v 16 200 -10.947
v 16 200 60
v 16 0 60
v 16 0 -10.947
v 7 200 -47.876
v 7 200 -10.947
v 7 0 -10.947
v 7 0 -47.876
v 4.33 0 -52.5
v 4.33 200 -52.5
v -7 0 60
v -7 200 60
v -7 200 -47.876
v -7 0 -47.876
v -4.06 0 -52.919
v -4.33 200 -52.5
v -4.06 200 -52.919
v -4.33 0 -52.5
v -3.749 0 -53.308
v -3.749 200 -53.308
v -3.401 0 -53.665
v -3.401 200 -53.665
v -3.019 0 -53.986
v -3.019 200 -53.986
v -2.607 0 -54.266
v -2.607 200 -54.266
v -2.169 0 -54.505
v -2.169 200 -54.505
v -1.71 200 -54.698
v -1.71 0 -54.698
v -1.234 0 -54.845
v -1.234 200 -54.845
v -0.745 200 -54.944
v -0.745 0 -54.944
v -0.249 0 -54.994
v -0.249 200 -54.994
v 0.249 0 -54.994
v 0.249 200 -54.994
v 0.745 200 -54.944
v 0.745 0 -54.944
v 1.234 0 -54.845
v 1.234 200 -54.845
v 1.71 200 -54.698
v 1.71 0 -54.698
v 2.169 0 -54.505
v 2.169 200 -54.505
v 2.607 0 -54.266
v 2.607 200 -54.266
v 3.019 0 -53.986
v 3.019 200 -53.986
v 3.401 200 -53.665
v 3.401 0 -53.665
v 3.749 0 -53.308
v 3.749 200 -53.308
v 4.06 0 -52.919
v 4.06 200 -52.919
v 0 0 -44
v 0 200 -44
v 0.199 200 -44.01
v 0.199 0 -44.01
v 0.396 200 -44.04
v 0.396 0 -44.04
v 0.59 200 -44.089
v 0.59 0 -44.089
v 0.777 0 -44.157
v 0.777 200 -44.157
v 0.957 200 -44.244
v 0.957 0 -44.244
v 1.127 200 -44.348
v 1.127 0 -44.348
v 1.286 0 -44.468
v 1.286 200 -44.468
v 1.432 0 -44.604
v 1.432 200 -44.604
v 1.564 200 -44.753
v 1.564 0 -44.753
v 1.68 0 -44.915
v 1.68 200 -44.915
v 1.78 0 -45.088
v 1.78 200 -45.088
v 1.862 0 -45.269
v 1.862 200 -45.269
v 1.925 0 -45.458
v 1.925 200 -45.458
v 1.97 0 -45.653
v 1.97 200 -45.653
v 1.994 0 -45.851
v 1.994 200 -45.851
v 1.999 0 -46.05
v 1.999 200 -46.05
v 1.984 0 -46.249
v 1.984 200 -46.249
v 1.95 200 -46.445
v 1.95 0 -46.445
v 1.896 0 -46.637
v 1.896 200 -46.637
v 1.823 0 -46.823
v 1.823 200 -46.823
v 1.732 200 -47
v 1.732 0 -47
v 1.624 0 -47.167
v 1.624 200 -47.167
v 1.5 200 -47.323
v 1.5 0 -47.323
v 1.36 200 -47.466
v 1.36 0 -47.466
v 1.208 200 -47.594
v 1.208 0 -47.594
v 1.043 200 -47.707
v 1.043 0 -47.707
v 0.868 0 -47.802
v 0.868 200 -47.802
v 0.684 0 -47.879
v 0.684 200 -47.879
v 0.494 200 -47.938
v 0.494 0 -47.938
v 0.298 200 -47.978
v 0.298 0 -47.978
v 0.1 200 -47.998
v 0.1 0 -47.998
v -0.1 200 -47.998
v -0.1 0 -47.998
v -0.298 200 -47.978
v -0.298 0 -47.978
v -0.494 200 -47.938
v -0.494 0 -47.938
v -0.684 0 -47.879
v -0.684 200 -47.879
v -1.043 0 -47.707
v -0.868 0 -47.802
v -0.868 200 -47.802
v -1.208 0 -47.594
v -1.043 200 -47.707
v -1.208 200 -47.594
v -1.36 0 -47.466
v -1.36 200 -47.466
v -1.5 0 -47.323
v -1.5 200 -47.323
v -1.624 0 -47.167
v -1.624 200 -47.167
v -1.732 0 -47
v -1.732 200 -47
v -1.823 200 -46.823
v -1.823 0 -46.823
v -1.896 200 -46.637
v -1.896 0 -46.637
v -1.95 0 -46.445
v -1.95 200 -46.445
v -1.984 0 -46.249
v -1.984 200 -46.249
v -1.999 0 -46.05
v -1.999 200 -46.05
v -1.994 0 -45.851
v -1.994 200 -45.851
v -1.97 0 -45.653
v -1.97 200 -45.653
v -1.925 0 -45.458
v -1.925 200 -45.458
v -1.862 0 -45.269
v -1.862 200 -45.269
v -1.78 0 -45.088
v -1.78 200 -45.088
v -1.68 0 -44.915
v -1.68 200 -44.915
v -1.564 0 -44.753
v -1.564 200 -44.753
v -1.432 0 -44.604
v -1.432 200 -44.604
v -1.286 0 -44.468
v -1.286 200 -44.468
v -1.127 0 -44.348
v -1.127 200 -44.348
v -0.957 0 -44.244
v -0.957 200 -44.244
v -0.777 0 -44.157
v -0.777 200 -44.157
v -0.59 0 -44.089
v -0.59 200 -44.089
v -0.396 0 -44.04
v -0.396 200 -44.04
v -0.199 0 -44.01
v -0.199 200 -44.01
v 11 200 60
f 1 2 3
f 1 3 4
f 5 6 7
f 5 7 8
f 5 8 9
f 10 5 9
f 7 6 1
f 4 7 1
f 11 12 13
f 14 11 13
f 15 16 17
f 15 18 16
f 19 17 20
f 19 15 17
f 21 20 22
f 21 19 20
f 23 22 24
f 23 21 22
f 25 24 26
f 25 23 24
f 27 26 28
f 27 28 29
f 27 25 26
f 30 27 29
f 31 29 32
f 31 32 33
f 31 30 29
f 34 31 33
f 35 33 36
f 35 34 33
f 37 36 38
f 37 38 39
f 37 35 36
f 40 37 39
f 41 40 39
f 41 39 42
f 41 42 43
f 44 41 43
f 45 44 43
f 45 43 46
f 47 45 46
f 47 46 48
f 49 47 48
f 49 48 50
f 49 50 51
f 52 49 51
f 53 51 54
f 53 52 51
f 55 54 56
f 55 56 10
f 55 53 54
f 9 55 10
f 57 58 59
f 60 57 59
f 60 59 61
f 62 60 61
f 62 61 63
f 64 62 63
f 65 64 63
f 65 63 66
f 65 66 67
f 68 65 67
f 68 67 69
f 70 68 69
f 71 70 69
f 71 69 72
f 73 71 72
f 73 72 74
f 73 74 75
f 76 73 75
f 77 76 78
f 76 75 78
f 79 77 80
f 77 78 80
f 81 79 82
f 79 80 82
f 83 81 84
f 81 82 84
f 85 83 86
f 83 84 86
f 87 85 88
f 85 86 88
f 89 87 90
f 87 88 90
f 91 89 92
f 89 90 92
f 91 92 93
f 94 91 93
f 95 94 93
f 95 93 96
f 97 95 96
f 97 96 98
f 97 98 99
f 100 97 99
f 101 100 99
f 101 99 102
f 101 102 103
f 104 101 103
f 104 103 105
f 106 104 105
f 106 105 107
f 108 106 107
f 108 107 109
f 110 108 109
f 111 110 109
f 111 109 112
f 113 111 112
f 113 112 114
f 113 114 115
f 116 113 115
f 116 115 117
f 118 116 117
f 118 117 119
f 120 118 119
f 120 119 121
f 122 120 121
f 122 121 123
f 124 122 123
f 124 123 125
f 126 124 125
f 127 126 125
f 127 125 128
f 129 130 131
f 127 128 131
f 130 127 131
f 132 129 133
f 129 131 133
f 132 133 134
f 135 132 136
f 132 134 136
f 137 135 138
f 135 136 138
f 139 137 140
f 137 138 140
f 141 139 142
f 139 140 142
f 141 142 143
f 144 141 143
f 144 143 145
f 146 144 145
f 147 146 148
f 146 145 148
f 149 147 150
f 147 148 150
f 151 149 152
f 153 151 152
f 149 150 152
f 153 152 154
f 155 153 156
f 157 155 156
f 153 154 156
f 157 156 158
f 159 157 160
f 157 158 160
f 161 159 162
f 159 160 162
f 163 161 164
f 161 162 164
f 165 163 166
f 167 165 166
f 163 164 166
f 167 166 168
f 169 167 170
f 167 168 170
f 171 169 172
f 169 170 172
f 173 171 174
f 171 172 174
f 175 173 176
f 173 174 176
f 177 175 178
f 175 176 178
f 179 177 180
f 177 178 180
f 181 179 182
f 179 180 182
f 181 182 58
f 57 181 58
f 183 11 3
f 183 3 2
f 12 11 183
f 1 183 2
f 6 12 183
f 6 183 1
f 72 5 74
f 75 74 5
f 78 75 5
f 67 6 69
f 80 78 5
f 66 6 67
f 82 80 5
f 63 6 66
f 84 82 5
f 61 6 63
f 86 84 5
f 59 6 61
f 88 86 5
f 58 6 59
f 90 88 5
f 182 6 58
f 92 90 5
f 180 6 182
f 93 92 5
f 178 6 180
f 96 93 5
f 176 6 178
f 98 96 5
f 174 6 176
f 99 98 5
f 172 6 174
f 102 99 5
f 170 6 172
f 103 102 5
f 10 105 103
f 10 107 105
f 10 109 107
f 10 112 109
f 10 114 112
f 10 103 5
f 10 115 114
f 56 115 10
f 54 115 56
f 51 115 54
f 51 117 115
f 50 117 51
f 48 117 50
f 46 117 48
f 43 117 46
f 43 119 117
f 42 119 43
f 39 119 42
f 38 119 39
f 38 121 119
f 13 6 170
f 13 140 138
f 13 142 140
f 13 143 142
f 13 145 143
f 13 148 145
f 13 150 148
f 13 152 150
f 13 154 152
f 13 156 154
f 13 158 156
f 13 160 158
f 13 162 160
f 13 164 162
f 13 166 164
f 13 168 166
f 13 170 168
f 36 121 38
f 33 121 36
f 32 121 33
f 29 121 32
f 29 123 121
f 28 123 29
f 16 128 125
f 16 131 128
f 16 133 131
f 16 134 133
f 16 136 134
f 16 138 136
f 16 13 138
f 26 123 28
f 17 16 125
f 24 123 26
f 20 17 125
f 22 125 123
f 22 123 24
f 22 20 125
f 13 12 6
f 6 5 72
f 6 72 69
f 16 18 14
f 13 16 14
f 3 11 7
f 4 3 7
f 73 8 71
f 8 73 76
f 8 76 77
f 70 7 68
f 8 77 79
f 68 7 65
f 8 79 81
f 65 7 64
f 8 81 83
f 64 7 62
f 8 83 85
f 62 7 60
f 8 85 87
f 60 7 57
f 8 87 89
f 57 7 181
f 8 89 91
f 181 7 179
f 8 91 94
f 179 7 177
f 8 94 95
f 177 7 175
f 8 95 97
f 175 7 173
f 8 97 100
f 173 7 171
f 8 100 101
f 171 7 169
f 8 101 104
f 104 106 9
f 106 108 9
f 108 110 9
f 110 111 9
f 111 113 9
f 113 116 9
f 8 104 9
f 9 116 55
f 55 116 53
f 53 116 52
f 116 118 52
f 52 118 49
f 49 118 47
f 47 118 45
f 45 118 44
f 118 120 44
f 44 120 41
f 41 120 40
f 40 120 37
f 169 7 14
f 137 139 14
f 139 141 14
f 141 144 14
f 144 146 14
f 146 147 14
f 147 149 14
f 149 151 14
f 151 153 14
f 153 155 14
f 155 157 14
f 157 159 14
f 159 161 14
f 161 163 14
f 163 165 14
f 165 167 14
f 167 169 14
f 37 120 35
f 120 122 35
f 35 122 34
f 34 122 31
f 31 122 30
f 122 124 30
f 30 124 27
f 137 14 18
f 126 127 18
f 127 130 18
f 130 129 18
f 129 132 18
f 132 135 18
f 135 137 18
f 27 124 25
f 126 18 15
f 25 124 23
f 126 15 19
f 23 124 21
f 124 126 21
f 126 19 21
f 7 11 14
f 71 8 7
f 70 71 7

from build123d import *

# Parameters (mm, degrees)
SKETCH1_W           = 22
SKETCH1_H           = 120
BOSS_EXTRUDE1_DEPTH = 200
SKETCH2_OUTSIDE_W   = 70.854
SKETCH2_OUTSIDE_H   = 168.854
CUT_EXTRUDE1_DEPTH  = 210.095671883
FILLET1_R           = 5
CUT_EXTRUDE2_DEPTH  = 210.095671883
SKETCH4_W           = 96.947441117
SKETCH4_H           = 200
BOSS_EXTRUDE2_DEPTH = 5
SKETCH5_W           = 4
SKETCH5_H           = 96.947441117
CUT_EXTRUDE3_DEPTH  = 210.418241803
SKETCH6_R           = 2
CUT_EXTRUDE4_DEPTH  = 210.418241803
SKETCH8_W           = 9
SKETCH8_H           = 26
CUT_EXTRUDE5_DEPTH  = 210.418241803


with BuildPart() as part:
    # Sketch1 → Boss-Extrude1 (new body)
    with BuildSketch(Plane(origin=(0, 0, 0), x_dir=(1, 0, 0), z_dir=(0, 1, 0))):
        Rectangle(SKETCH1_W, SKETCH1_H)
    extrude(amount=BOSS_EXTRUDE1_DEPTH)

    # Sketch2 outside → Cut-Extrude1 (cut, through all)
    with BuildSketch(Plane(origin=(0, 200, 0), x_dir=(1, 0, 0), z_dir=(0, 1, 0))):
        Rectangle(SKETCH2_OUTSIDE_W, SKETCH2_OUTSIDE_H)
        Polygon((0, 60), (-11, 40.947441117), (-11, -60), (11, -60), (11, 40.947441117), align=None, mode=Mode.SUBTRACT)
    extrude(amount=-CUT_EXTRUDE1_DEPTH, mode=Mode.SUBTRACT)

    # Fillet1
    fillet1_edges = [part.edges().sort_by_distance(p)[0] for p in [
        (0, 100, -60),
    ]]
    fillet(fillet1_edges, radius=FILLET1_R)

    # Sketch3 → Cut-Extrude2 (cut, through all)
    with BuildSketch(Plane(origin=(0, 200, 0), x_dir=(1, 0, 0), z_dir=(0, 1, 0))):
        Polygon((-11, 36.947441117), (-7, 36.947441117), (-7, 47.875644347), (-11, 40.947441117), align=None)
        Polygon((7, 47.875644347), (11, 40.947441117), (11, 36.947441117), (7, 36.947441117), align=None)
    extrude(amount=-CUT_EXTRUDE2_DEPTH, mode=Mode.SUBTRACT)

    # Sketch4 → Boss-Extrude2 (add)
    with BuildSketch(Plane(origin=(11, 0, 0), x_dir=(0, 0, -1), z_dir=(1, 0, 0))):
        with Locations((-11.526279442, 100)):
            Rectangle(SKETCH4_W, SKETCH4_H)
    extrude(amount=BOSS_EXTRUDE2_DEPTH)

    # Sketch5 → Cut-Extrude3 (cut, through all)
    with BuildSketch(Plane(origin=(0, 200, 0), x_dir=(1, 0, 0), z_dir=(0, 1, 0))):
        with Locations((-9, -11.526279442)):
            Rectangle(SKETCH5_W, SKETCH5_H)
    extrude(amount=-CUT_EXTRUDE3_DEPTH, mode=Mode.SUBTRACT)

    # Sketch6 → Cut-Extrude4 (cut, through all)
    with BuildSketch(Plane(origin=(0, 200, 0), x_dir=(1, 0, 0), z_dir=(0, 1, 0))):
        with Locations(Location((0, 46, 0), (0, 0, 270))):
            Circle(SKETCH6_R)
    extrude(amount=-CUT_EXTRUDE4_DEPTH, mode=Mode.SUBTRACT)

    # Sketch8 → Cut-Extrude5 (cut, through all)
    with BuildSketch(Plane(origin=(0, 200, 0), x_dir=(1, 0, 0), z_dir=(0, 1, 0))):
        with Locations((11.5, 23.947441117)):
            Rectangle(SKETCH8_W, SKETCH8_H)
    extrude(amount=-CUT_EXTRUDE5_DEPTH, mode=Mode.SUBTRACT)


solid = part.part
